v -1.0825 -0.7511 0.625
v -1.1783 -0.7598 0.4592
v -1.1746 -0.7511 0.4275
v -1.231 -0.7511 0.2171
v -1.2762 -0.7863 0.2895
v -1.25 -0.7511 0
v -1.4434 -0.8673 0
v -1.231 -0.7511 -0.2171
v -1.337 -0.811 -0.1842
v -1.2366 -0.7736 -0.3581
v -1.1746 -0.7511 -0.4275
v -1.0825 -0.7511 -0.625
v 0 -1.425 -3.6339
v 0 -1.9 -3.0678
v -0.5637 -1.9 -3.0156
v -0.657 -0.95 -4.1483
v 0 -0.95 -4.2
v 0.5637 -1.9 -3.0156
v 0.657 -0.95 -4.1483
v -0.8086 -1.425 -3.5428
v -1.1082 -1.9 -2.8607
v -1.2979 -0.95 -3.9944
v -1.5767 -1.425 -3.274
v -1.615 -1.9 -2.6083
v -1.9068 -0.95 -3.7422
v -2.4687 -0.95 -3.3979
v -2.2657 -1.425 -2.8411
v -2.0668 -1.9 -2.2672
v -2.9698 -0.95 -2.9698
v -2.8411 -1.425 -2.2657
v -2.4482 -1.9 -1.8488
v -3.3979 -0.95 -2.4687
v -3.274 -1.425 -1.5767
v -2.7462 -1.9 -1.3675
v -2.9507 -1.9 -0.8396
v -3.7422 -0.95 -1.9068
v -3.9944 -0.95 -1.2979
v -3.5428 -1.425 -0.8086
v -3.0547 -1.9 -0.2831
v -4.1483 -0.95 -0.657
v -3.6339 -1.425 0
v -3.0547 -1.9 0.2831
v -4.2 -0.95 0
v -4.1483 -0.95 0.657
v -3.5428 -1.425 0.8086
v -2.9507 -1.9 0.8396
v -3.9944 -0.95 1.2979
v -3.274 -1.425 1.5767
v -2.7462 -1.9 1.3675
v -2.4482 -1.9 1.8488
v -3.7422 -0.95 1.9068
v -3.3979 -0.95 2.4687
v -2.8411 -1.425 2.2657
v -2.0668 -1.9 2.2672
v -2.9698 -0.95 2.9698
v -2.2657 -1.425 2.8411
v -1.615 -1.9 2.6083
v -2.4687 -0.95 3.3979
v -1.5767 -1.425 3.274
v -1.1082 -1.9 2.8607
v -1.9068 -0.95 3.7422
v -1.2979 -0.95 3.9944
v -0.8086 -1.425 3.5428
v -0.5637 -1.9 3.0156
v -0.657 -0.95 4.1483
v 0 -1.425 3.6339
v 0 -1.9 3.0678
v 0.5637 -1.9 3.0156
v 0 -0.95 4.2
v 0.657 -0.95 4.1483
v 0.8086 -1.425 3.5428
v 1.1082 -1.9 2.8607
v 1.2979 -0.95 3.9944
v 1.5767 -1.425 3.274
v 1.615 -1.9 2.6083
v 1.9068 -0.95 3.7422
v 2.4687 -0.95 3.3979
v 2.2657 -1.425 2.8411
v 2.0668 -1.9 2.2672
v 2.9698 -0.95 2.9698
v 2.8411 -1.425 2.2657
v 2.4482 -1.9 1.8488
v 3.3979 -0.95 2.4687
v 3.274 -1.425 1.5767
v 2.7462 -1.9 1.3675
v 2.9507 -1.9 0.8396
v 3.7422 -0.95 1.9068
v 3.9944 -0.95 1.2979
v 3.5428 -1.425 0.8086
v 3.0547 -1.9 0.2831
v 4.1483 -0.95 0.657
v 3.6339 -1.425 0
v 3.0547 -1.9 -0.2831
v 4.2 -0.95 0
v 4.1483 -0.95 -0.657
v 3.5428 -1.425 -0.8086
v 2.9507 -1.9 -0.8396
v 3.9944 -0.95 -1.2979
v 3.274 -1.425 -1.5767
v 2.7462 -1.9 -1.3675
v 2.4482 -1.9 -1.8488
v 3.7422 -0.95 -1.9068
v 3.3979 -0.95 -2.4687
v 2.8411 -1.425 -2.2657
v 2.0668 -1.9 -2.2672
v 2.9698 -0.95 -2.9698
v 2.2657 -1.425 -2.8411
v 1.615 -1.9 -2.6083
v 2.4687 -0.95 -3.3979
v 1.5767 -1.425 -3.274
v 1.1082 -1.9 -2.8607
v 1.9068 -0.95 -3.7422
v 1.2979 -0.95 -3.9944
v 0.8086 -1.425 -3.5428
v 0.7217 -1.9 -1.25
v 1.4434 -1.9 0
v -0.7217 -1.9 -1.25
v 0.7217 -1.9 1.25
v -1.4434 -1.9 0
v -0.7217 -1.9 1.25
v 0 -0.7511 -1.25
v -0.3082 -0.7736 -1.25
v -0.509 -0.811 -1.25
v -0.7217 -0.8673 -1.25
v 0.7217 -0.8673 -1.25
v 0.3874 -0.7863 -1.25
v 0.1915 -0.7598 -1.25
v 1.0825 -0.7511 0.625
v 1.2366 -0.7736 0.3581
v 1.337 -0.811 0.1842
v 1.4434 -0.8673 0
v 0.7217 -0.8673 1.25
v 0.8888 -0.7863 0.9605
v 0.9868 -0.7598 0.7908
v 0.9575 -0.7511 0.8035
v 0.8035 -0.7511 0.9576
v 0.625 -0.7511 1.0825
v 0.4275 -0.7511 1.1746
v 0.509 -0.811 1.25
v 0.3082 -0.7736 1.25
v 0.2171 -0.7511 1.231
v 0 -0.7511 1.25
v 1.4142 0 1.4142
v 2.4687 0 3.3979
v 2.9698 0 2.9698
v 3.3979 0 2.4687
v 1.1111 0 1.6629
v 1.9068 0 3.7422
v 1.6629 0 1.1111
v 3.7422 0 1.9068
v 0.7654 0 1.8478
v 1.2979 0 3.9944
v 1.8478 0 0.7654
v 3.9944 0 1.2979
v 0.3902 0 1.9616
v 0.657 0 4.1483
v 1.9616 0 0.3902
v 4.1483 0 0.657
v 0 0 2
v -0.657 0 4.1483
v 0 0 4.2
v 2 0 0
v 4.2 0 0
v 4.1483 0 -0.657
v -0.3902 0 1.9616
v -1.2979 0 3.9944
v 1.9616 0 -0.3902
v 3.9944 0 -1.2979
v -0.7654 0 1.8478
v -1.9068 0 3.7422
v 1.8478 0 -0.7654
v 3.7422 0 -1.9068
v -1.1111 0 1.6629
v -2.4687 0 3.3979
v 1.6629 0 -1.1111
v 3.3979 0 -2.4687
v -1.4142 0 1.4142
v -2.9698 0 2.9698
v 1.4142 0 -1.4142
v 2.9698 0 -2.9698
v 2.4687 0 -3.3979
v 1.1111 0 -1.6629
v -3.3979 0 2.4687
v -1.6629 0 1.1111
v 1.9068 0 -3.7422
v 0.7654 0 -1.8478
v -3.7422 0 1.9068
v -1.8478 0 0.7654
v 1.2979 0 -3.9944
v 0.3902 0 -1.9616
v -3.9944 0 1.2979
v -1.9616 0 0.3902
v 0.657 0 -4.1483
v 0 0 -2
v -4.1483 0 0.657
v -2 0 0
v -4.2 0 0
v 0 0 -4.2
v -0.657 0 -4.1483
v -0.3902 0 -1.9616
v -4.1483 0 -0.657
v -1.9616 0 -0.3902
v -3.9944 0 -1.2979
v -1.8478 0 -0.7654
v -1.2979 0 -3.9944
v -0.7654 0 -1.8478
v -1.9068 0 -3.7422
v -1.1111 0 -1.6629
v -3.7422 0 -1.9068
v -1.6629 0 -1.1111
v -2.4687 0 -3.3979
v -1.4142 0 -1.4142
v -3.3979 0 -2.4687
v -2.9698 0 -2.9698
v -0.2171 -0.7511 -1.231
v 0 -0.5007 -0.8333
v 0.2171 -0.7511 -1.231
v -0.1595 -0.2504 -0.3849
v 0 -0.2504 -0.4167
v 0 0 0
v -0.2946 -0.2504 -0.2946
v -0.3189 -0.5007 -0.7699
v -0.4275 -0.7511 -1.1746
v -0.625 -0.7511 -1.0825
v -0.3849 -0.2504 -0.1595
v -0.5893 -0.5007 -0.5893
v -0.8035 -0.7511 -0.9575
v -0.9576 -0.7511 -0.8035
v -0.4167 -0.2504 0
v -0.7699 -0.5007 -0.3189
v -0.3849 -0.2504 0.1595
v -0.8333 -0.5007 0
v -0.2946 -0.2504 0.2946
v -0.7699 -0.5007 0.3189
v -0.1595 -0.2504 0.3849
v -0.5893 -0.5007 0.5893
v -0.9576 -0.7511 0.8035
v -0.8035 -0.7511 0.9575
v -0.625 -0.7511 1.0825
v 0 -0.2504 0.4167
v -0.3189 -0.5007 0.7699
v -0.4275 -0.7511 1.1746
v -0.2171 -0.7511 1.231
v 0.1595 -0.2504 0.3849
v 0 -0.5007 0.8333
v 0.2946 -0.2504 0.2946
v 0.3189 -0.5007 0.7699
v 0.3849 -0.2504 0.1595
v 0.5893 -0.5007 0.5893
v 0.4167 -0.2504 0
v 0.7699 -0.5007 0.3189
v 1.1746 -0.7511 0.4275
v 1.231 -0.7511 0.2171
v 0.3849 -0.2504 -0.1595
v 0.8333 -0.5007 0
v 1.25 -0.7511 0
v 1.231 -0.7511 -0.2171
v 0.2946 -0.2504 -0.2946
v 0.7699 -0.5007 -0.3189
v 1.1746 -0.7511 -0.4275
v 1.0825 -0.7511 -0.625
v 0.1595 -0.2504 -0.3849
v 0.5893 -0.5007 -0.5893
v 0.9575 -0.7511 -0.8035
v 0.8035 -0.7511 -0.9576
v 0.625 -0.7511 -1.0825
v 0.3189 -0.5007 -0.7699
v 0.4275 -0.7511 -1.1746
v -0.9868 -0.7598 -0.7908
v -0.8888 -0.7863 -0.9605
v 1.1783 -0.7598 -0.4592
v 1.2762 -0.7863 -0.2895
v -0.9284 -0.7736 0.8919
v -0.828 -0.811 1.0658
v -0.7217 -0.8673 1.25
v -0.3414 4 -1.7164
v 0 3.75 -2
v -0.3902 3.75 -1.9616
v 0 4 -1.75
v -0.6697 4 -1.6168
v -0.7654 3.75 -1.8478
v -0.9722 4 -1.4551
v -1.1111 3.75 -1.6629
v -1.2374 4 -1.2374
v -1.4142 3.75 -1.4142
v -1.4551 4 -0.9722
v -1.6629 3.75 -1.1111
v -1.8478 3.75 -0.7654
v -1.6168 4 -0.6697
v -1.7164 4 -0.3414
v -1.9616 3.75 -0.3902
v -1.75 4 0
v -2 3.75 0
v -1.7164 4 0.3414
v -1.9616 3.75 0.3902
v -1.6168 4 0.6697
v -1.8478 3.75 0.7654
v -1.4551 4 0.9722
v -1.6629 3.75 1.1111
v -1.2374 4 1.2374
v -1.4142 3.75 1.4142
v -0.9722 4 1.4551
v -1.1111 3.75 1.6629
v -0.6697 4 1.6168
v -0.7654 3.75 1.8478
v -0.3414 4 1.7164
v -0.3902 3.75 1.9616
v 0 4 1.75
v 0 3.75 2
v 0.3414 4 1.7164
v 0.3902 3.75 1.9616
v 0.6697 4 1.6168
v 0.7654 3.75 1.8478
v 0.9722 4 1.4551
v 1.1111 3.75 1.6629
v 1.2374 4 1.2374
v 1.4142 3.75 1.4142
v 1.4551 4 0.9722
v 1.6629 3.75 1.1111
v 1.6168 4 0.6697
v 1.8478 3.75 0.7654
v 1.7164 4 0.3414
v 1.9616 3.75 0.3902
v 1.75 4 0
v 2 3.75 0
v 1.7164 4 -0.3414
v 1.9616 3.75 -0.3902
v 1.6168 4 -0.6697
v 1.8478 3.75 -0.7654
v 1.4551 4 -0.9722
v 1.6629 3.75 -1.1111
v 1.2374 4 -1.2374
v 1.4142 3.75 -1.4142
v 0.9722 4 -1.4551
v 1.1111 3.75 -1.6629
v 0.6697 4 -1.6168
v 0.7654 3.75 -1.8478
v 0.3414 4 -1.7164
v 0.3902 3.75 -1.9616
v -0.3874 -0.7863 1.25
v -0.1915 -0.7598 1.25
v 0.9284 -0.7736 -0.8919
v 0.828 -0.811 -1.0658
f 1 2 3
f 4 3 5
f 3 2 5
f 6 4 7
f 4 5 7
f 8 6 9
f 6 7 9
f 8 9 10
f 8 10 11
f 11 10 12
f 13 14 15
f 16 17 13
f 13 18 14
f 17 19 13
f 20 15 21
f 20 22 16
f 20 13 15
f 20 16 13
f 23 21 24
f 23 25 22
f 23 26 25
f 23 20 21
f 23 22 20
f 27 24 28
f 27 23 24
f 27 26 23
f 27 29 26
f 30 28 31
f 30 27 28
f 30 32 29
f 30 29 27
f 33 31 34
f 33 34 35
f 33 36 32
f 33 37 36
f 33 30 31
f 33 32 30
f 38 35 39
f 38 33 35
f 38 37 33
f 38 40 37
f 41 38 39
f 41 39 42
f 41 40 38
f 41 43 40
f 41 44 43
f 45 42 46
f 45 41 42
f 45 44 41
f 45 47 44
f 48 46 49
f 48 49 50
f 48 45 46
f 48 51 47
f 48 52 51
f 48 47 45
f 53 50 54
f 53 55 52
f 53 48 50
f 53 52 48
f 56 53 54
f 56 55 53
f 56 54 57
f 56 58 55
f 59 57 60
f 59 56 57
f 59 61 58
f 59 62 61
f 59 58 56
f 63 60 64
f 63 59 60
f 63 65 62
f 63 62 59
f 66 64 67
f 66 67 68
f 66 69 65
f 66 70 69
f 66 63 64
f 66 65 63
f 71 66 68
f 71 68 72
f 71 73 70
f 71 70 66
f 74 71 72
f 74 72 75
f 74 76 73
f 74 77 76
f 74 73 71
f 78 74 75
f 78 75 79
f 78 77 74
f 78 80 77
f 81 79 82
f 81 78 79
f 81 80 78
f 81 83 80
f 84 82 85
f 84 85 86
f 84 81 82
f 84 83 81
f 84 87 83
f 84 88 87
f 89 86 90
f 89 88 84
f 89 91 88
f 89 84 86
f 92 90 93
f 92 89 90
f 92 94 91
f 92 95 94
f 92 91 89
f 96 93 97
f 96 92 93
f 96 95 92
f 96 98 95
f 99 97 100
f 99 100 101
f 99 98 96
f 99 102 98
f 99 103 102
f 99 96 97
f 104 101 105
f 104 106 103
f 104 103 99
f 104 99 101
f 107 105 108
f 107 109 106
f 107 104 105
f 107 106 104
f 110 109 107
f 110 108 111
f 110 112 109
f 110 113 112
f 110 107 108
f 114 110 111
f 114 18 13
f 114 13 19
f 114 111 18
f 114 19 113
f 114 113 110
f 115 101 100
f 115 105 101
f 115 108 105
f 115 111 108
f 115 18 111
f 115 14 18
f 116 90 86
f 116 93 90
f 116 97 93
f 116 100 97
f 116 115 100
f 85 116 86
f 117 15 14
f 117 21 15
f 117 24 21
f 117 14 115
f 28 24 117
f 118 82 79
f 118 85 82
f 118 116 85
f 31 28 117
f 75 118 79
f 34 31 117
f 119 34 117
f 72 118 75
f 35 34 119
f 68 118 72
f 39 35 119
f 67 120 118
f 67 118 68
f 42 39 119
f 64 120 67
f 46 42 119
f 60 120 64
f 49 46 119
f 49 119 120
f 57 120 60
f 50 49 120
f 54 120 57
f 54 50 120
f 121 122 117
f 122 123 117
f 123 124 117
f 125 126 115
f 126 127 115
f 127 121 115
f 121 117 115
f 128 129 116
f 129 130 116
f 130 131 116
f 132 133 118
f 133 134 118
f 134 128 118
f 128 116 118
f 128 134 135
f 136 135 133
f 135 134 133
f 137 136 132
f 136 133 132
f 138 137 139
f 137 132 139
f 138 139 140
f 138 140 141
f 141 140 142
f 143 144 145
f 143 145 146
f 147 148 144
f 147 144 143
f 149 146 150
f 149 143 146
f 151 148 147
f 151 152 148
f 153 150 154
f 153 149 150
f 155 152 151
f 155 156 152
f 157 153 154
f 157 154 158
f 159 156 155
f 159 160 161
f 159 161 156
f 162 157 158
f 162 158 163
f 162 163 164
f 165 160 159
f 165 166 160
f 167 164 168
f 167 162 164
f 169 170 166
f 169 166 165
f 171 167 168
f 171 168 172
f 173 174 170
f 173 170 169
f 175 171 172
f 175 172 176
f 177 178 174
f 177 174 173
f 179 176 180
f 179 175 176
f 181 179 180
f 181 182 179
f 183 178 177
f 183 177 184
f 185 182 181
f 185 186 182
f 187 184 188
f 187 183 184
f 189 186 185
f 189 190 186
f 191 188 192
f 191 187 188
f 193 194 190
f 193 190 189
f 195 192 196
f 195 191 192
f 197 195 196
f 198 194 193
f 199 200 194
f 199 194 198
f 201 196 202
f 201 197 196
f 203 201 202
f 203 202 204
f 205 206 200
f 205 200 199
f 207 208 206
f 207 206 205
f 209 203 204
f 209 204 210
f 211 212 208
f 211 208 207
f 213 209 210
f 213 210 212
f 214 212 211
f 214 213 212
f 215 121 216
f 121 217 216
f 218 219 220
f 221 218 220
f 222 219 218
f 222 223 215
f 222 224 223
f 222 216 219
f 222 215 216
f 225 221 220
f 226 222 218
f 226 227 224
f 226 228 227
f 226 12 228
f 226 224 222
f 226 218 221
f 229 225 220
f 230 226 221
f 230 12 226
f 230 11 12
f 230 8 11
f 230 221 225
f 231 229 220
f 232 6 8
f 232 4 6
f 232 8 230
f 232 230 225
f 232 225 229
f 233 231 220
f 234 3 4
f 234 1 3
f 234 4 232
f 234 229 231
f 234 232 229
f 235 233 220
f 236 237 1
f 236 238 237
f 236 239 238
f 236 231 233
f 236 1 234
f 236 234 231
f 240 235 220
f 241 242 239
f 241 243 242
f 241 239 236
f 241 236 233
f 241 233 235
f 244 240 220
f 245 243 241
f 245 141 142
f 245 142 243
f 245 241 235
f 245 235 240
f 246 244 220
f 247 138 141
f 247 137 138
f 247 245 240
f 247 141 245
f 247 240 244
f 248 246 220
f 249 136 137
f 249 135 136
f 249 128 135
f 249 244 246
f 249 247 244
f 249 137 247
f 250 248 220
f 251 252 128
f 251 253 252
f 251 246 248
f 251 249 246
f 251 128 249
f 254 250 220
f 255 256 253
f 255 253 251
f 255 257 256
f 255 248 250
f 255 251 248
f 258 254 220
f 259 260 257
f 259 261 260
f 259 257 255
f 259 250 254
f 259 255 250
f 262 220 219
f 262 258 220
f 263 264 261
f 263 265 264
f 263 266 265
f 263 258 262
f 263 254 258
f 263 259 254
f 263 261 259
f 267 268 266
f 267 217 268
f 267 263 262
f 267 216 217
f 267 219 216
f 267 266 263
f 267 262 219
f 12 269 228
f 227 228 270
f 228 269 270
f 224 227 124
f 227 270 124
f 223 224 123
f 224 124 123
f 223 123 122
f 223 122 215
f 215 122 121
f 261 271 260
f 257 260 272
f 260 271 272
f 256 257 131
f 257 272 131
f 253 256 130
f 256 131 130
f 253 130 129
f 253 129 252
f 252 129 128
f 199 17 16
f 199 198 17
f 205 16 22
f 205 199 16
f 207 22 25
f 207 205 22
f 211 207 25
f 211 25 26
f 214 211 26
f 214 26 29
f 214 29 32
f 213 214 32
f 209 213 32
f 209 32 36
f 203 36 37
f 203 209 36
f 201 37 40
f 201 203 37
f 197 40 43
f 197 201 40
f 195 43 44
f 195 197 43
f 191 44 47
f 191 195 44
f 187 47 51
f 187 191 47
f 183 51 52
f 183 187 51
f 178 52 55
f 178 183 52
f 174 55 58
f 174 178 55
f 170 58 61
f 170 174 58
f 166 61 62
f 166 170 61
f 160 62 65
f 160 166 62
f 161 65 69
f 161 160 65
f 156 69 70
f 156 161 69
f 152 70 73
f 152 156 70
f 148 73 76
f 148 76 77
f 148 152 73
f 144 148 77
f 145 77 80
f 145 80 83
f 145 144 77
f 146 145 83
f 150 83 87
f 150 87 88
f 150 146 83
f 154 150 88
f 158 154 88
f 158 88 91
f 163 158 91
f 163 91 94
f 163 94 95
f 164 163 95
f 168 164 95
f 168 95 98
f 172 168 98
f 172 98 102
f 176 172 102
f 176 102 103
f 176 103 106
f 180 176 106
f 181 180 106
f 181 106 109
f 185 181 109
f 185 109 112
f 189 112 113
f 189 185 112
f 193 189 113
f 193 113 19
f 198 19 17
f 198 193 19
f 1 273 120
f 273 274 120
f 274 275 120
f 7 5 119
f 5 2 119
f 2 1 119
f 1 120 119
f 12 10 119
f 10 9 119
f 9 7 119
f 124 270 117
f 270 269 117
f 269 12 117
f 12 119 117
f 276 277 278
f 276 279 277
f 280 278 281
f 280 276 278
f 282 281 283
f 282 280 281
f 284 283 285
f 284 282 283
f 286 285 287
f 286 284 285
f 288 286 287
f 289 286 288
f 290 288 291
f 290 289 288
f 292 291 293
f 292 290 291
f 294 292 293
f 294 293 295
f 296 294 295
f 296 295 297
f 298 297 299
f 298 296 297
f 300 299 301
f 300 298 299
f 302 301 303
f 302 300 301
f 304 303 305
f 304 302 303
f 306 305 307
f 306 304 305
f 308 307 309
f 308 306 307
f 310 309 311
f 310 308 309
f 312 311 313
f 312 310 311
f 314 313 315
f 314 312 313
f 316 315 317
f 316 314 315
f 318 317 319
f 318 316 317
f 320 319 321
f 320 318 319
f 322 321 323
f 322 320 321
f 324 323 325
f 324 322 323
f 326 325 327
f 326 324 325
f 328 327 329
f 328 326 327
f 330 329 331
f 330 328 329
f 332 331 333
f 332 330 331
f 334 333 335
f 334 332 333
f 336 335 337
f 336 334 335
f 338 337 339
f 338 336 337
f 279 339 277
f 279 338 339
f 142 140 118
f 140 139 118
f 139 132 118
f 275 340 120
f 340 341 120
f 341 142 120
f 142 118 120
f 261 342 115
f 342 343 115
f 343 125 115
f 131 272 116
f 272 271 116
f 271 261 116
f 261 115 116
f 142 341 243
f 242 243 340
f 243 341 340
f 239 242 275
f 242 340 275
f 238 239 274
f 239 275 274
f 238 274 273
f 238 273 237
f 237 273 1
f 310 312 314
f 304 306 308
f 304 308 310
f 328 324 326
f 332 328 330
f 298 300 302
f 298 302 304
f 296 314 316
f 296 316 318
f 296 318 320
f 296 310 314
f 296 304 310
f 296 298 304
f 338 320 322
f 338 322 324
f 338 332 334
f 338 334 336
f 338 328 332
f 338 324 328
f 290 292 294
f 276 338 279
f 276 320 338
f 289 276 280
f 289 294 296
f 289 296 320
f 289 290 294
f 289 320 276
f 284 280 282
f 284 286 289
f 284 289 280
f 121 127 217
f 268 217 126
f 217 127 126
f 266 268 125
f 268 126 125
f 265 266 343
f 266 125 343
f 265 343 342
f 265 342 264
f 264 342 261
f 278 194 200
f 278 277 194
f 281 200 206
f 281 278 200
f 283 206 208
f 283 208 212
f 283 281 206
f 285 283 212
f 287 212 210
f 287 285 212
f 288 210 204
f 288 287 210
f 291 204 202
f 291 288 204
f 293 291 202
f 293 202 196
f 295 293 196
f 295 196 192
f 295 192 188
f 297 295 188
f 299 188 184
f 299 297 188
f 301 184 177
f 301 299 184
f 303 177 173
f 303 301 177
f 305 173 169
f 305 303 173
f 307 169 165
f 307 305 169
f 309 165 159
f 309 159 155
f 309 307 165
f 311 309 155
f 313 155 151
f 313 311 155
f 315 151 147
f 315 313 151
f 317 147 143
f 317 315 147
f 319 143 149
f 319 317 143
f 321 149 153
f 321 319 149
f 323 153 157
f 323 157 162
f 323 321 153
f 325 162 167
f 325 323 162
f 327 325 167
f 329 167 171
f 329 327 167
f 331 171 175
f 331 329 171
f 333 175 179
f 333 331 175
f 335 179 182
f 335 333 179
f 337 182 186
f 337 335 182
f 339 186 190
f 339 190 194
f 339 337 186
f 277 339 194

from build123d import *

# Parameters (mm, degrees)
CUT_EXTRUDE_1_REACH = 10.372


with BuildPart() as part:
    # 草图1 → 旋转1 (revolve)
    with BuildSketch(Plane.XY, mode=Mode.PRIVATE) as revolve_1_sk:
        Polygon((2, 0), (2, 3.75), (1.75, 4), (0, 4), (0, 0), (1.25, -0.751075774), (1.25, -1.9), (3.067834087, -1.9), (4.2, -0.95), (4.2, 0), align=None)
    revolve(revolve_1_sk.sketch.rotate(Axis((0, 0, 0), (0, 1, 0)), 90), axis=Axis((0, 0, 0), (0, 1, 0)))

    # 切除-拉伸1: up to this cone (the profile starts inside it)
    cut_extrude_1_end = Plane(origin=(0, -1.9, 0), z_dir=(0, -1, 0)).offset(-1.899999) * Cone(1.664e-06, 26.51884732, 15.934130016, align=(Align.CENTER, Align.CENTER, Align.MIN), mode=Mode.PRIVATE)
    # 草图2 → 切除-拉伸1 (cut, up to the surface)
    with BuildSketch(Plane.XZ.offset(1.9), mode=Mode.PRIVATE) as cut_extrude_1_sk1:
        Polygon((1.443375673, 0), (0.721687836, 1.25), (-0.721687836, 1.25), (-1.443375673, 0), (-0.721687836, -1.25), (0.721687836, -1.25), align=None)
    cut_extrude_1_tool1 = extrude(cut_extrude_1_sk1.sketch, amount=-CUT_EXTRUDE_1_REACH, mode=Mode.PRIVATE) & cut_extrude_1_end
    add(cut_extrude_1_tool1.solids().sort_by_distance((0, -1.9, 0))[0], mode=Mode.SUBTRACT)


solid = part.part
